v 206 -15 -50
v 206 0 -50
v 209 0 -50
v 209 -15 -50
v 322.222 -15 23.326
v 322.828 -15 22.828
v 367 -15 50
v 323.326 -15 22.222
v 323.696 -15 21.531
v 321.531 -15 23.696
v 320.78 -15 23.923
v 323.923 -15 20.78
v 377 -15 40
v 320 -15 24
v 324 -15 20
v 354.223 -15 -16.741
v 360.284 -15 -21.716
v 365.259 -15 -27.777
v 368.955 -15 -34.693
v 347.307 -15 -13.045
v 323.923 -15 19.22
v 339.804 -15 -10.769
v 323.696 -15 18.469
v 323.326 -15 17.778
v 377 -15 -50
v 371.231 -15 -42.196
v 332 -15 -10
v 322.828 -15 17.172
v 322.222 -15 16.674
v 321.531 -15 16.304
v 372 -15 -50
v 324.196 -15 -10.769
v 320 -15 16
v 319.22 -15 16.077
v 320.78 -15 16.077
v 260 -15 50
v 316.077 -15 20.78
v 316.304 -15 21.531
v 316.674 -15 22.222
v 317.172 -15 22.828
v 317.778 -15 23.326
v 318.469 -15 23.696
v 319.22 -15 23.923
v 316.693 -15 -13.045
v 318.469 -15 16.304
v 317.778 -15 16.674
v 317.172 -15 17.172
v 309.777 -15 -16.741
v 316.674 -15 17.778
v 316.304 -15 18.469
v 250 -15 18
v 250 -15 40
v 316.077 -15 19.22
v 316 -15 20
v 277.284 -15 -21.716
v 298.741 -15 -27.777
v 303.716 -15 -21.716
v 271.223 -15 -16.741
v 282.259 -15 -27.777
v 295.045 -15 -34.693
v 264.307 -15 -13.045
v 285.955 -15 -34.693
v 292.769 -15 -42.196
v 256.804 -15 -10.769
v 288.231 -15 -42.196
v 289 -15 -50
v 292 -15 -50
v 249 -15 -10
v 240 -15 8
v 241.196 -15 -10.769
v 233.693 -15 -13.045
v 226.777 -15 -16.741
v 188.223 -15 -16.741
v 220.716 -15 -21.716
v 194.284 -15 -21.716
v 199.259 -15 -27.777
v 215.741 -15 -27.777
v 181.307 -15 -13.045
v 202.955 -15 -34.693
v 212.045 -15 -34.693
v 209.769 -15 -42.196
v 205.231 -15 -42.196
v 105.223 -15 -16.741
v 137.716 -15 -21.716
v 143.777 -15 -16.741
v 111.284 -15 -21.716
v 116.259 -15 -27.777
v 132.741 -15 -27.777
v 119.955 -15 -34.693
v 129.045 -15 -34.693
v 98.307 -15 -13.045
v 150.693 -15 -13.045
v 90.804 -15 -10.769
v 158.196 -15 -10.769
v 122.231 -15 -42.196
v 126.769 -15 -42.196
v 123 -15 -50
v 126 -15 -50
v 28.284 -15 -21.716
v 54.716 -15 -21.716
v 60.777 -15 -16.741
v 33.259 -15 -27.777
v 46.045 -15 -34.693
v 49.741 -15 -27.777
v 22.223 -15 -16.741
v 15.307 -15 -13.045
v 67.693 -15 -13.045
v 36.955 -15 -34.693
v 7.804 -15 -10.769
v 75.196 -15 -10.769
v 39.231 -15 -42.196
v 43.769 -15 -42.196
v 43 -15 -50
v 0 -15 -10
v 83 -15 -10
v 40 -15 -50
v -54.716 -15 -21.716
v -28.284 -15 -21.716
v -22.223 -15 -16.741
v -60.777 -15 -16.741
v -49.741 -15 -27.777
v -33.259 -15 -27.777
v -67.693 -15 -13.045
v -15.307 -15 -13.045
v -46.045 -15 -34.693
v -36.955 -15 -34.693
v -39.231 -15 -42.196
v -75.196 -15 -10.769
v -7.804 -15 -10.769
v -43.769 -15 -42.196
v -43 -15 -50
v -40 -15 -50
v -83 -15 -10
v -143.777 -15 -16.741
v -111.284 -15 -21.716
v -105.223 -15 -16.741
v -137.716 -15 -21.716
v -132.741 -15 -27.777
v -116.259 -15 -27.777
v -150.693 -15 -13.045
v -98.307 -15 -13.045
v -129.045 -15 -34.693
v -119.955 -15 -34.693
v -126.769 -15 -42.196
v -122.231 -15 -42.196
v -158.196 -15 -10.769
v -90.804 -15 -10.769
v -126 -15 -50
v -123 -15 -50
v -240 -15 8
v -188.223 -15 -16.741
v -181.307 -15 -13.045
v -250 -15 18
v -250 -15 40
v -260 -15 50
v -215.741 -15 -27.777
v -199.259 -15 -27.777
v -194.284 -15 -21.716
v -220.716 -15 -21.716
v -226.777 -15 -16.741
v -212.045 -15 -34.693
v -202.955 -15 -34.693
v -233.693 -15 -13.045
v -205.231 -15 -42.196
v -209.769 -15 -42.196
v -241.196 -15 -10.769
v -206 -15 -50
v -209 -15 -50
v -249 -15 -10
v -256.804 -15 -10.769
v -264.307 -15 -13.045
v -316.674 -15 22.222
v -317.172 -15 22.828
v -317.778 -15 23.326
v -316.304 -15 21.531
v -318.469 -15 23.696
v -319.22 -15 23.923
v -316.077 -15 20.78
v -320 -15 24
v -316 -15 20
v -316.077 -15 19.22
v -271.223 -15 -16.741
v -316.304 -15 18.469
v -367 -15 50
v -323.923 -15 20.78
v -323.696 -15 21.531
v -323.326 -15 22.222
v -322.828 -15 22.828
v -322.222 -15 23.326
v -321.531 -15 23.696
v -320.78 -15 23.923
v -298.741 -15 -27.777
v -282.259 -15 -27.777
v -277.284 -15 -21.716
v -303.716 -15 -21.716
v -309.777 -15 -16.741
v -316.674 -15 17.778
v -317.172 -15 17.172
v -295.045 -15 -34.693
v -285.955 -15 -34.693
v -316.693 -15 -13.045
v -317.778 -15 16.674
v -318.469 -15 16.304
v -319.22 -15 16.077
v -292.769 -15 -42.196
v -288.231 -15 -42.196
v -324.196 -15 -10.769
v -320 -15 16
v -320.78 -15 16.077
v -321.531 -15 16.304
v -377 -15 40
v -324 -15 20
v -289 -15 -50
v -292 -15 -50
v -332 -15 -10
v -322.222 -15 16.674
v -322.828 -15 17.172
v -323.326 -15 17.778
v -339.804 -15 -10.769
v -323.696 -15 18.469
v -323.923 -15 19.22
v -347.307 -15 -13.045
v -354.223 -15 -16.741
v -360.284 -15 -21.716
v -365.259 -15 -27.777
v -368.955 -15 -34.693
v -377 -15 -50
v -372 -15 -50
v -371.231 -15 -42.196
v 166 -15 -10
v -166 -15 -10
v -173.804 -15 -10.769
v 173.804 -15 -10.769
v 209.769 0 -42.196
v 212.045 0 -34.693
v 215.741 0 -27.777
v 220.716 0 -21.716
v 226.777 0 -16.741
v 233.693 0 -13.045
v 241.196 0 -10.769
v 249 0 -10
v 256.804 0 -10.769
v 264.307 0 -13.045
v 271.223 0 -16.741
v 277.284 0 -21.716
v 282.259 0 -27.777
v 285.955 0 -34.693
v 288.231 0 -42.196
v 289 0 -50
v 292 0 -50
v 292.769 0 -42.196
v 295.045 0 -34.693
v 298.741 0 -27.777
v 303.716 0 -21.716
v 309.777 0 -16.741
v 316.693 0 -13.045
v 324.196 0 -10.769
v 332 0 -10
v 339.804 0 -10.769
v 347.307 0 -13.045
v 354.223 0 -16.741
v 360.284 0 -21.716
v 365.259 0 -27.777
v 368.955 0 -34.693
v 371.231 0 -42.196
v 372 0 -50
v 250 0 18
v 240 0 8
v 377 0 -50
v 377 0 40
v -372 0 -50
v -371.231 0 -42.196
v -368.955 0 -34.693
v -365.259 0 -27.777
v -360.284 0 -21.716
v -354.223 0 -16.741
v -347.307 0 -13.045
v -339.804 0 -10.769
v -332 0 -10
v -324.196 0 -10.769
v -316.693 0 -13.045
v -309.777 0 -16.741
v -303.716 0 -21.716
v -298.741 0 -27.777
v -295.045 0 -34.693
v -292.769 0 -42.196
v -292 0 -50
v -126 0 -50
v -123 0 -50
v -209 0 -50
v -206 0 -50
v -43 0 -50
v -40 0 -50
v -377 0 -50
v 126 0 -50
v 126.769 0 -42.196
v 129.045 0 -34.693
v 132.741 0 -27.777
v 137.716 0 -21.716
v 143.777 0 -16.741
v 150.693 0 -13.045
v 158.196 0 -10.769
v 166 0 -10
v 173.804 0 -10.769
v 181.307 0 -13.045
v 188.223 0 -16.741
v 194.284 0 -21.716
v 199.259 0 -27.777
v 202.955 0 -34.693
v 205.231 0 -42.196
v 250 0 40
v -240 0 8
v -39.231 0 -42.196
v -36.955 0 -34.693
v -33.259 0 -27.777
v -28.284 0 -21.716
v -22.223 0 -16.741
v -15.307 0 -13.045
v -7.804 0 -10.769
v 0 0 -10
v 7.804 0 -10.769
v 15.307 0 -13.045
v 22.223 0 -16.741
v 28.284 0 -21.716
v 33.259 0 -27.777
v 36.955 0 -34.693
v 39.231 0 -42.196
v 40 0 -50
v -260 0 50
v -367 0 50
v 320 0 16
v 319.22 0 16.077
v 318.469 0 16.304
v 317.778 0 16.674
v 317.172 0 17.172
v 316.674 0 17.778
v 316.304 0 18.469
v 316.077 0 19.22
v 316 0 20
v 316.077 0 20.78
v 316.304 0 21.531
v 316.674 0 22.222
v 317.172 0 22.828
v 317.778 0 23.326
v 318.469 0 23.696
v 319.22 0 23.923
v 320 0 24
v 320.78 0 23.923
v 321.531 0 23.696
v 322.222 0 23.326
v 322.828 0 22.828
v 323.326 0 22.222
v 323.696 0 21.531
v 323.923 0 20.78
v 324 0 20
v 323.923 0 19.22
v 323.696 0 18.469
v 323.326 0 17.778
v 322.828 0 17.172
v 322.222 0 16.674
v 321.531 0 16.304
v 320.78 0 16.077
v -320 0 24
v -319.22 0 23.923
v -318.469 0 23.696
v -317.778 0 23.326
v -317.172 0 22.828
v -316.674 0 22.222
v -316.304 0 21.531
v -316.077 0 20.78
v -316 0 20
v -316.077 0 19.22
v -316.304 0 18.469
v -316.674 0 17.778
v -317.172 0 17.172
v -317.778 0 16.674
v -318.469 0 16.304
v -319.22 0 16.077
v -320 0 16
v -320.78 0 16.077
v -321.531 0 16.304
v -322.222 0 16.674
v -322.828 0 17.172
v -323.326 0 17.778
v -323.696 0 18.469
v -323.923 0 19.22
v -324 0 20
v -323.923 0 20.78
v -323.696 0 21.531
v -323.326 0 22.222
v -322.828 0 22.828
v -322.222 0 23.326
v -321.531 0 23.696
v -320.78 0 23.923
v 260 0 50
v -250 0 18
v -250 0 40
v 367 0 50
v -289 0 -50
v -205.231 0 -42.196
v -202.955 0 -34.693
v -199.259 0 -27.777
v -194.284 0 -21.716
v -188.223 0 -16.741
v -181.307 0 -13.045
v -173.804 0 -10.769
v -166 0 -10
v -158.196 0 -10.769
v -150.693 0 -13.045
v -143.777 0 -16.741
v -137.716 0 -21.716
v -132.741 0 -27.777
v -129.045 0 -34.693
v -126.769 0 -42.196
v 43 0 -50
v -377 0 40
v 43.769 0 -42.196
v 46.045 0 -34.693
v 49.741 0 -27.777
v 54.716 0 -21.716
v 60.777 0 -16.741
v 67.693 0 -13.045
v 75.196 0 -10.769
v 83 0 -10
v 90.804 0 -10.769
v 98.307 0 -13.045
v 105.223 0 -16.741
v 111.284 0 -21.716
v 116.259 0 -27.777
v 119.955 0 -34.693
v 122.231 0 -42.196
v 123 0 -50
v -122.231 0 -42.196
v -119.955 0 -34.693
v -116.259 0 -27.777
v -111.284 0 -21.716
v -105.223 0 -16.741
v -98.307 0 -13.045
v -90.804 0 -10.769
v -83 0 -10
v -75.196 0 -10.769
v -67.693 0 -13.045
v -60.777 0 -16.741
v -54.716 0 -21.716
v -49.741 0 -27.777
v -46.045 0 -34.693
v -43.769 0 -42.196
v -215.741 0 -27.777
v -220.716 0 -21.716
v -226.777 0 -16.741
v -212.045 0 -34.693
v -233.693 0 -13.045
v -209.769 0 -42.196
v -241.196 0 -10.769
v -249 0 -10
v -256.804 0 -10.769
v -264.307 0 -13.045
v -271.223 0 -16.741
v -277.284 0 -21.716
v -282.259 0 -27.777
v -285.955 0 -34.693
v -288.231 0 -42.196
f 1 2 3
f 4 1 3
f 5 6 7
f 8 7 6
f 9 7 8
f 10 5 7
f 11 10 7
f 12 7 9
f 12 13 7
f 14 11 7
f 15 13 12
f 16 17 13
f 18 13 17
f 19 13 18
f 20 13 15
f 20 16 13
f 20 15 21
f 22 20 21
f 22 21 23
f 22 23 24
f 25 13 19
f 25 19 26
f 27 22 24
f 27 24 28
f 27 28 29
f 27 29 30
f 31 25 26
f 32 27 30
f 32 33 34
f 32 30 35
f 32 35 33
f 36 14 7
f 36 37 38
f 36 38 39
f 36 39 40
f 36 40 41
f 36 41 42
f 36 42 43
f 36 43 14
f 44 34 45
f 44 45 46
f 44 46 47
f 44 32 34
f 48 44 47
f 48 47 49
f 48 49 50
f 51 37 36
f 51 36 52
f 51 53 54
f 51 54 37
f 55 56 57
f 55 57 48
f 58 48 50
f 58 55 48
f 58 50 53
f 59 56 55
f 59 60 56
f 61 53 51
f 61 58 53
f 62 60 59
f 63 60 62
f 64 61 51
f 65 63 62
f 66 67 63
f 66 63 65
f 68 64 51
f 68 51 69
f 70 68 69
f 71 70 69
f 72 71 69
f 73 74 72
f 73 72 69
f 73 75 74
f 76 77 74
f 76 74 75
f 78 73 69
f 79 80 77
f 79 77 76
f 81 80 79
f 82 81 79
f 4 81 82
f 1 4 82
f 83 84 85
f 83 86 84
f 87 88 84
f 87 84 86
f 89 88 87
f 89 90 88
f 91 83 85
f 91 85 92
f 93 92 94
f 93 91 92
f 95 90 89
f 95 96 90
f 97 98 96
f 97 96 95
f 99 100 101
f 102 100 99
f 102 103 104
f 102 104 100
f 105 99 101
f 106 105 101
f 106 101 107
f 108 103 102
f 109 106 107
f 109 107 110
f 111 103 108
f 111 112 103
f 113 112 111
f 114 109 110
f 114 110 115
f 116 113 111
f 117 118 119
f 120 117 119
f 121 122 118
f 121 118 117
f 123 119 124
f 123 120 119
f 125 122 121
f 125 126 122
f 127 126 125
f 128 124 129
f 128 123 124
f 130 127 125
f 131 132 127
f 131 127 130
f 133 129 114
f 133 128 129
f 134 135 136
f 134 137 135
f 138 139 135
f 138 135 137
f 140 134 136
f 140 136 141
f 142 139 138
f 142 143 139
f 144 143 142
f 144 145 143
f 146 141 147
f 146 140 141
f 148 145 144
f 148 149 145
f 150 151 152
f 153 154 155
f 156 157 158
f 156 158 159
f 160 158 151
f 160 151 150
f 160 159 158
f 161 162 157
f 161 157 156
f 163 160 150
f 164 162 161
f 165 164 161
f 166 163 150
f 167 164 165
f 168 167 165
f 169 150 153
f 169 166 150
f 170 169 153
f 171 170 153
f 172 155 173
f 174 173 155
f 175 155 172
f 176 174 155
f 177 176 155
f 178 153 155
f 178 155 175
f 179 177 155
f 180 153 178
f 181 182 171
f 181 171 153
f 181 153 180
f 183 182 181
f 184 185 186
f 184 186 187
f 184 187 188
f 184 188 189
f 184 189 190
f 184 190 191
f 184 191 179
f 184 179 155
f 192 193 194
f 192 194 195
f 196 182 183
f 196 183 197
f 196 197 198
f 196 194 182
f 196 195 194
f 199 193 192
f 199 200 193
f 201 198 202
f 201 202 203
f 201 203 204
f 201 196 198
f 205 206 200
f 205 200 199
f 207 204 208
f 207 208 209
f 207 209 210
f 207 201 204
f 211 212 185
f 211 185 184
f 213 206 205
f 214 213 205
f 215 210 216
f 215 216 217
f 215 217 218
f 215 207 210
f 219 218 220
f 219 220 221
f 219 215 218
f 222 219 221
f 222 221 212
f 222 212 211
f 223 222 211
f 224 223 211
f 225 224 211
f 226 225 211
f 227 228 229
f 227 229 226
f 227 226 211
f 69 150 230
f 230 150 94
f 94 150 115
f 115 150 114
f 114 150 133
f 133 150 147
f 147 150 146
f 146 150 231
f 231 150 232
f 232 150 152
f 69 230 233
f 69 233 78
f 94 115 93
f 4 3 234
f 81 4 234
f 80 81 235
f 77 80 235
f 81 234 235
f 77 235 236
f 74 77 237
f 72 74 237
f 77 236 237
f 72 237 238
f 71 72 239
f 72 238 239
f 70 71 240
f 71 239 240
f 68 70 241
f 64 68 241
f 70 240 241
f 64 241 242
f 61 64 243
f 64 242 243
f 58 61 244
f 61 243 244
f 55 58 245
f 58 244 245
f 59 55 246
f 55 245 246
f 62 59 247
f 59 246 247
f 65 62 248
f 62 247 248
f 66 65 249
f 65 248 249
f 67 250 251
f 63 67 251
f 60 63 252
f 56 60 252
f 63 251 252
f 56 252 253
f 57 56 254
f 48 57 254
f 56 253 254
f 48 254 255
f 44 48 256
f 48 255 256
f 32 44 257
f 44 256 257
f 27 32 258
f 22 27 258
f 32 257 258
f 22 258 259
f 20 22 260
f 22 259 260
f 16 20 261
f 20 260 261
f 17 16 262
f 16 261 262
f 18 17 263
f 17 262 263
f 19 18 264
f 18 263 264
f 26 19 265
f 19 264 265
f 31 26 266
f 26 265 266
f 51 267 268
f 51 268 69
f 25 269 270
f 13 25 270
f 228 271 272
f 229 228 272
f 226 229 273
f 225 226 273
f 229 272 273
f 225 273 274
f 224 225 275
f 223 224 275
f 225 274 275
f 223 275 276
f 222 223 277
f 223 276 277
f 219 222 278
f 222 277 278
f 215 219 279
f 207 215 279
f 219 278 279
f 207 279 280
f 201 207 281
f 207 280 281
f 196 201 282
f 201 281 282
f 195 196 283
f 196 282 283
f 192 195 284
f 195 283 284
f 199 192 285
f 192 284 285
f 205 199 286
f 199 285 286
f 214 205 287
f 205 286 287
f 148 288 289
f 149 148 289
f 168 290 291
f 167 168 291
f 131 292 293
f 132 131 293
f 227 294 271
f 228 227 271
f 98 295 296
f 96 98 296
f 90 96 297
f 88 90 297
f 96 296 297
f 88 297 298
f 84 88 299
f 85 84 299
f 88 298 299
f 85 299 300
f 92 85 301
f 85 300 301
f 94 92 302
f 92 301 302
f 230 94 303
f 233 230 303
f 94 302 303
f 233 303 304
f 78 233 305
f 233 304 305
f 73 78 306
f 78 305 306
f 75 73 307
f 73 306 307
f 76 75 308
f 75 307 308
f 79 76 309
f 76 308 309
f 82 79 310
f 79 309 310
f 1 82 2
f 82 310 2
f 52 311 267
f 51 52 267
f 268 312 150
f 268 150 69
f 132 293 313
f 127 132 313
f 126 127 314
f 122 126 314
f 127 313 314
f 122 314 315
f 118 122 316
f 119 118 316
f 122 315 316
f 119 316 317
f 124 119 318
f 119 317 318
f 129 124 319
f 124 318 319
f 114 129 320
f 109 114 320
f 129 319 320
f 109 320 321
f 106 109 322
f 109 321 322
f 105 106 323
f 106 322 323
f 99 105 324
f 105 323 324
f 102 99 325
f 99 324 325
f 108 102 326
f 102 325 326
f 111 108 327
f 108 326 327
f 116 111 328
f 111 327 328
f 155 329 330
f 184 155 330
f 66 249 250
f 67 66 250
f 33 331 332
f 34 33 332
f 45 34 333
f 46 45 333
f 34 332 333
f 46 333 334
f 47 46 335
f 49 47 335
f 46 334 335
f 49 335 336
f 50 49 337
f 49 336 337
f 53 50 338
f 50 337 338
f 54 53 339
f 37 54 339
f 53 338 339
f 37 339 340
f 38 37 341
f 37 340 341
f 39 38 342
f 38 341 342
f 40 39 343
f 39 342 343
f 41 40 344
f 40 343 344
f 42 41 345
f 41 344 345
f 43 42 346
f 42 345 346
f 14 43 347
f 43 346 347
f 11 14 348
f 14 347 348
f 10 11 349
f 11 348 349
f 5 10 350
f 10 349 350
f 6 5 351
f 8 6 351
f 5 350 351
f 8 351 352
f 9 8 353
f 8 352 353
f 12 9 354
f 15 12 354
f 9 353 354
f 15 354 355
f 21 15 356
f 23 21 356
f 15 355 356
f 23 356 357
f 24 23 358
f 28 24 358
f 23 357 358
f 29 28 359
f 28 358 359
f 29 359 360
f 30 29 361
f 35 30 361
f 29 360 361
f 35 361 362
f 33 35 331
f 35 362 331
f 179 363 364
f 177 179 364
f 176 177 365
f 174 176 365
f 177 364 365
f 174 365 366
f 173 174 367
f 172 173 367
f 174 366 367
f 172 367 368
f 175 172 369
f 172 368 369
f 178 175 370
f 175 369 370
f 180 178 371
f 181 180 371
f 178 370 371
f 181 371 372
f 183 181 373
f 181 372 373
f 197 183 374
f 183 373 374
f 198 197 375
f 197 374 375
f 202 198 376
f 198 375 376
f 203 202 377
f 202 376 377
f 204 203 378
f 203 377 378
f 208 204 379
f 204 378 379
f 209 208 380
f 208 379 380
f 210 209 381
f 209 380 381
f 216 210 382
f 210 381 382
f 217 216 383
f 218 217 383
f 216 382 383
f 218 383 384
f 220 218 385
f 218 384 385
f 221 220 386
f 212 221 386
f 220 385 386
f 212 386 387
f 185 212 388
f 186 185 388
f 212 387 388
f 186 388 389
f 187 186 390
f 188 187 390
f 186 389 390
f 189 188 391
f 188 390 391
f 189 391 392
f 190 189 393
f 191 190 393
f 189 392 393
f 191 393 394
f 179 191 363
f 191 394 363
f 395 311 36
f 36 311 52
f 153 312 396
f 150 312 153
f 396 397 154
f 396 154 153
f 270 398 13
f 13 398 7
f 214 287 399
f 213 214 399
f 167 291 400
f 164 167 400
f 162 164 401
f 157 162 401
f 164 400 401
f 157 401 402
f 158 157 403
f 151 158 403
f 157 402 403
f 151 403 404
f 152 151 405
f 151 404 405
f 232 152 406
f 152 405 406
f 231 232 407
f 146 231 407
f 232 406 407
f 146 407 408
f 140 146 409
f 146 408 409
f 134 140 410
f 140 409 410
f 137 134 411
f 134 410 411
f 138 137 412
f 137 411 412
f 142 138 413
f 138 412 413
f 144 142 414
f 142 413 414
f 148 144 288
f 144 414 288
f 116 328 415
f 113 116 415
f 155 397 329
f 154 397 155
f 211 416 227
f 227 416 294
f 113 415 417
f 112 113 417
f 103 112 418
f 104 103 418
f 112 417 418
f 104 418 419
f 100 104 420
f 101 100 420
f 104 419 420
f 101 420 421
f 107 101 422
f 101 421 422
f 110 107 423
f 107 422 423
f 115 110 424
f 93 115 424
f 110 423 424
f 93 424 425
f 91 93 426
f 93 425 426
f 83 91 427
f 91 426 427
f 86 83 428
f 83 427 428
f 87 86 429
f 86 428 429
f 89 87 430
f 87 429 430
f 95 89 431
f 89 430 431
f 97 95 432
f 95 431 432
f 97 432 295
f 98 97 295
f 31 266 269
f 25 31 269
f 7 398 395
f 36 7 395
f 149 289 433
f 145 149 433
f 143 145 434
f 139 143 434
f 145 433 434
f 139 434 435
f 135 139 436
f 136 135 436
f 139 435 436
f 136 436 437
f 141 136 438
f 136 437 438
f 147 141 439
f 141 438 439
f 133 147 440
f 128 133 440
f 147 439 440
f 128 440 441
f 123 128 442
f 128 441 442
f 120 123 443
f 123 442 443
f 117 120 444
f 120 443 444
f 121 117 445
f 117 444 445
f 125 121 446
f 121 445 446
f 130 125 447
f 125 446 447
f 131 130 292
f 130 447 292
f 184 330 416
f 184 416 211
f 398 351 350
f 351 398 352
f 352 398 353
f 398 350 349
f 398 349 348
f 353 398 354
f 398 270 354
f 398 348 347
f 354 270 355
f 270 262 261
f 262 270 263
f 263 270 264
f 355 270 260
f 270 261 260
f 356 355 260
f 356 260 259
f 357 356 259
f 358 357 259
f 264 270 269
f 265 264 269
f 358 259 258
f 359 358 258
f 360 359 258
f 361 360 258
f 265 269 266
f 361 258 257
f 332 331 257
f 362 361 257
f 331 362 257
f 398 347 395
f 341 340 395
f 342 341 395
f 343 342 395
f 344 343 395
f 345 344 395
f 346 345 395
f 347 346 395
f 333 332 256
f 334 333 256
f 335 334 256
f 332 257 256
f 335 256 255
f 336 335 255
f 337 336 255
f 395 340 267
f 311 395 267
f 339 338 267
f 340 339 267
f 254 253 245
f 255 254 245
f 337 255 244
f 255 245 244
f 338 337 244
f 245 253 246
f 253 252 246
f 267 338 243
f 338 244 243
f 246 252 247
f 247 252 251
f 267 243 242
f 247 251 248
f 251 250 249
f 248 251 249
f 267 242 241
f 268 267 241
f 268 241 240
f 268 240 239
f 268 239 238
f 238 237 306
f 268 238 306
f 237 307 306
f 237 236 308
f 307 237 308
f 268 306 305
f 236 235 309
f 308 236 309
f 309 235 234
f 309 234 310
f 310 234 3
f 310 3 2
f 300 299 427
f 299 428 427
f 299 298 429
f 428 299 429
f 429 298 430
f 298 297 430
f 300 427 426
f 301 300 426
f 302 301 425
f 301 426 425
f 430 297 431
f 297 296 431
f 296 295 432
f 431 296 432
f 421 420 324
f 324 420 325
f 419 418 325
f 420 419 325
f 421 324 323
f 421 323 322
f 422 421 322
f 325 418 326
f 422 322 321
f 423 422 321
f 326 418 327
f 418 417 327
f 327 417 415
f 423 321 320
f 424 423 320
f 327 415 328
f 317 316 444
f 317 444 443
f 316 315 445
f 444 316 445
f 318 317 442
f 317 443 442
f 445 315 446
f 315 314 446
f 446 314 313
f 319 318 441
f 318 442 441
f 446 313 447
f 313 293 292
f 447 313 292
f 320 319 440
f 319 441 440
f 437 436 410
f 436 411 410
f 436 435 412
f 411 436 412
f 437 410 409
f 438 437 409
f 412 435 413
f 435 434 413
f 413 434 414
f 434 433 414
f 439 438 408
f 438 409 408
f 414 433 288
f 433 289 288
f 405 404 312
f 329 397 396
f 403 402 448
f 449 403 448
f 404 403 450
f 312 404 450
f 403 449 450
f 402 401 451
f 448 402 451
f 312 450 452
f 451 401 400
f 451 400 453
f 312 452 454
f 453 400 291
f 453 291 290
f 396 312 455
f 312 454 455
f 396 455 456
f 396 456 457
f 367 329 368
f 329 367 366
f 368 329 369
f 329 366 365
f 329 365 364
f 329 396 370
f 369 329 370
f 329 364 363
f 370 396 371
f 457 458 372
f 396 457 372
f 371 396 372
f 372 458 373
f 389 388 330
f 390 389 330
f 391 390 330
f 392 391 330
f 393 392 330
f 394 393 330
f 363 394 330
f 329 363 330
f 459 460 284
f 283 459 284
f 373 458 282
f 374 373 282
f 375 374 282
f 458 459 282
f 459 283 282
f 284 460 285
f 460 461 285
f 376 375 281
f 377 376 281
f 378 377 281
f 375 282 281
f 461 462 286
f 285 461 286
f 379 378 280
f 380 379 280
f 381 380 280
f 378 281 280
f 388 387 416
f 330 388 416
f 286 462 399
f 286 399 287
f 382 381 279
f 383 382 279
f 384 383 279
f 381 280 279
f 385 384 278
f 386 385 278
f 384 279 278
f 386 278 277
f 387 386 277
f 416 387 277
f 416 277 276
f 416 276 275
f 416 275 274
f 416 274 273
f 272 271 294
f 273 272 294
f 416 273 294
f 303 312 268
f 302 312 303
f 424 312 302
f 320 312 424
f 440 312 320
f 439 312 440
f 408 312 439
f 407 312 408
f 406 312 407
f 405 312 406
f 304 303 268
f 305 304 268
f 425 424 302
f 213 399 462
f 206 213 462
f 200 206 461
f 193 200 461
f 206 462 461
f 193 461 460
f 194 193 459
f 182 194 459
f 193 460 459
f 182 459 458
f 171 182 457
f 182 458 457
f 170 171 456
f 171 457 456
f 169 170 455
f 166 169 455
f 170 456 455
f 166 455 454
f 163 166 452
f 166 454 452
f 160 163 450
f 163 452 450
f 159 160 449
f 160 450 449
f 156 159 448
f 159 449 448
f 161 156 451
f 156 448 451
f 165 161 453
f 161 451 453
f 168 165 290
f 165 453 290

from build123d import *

# Parameters (mm, degrees)
SKETCH1_R          = 4
BASE_FLANGE1_DEPTH = 15
SKETCH6_W          = 500
SKETCH6_H          = 42
CUT_EXTRUDE1_DEPTH = 381.59689962
CHAMFER1_SIZE      = 10


# Sheet-metal steps are written as plain solids
with BuildPart() as part:
    # Sketch1 → Base-Flange1 (new body)
    with BuildSketch(Plane(origin=(0, 0, 0), x_dir=(1, 0, 0), z_dir=(0, 1, 0))):
        with BuildLine():
            Line((372, 50), (377, 50))
            Line((377, 50), (377, -50))
            Line((377, -50), (-377, -50))
            Line((-377, -50), (-377, 50))
            Line((-377, 50), (-372, 50))
            ThreePointArc((-372, 50), (-332, 10), (-292, 50))
            Line((-292, 50), (-289, 50))
            ThreePointArc((-289, 50), (-249, 10), (-209, 50))
            Line((-209, 50), (-206, 50))
            ThreePointArc((-206, 50), (-166, 10), (-126, 50))
            Line((-126, 50), (-123, 50))
            ThreePointArc((-123, 50), (-83, 10), (-43, 50))
            Line((-43, 50), (-40, 50))
            ThreePointArc((-40, 50), (0, 10), (40, 50))
            Line((40, 50), (43, 50))
            ThreePointArc((43, 50), (83, 10), (123, 50))
            Line((123, 50), (126, 50))
            ThreePointArc((126, 50), (166, 10), (206, 50))
            Line((206, 50), (209, 50))
            ThreePointArc((209, 50), (249, 10), (289, 50))
            Line((289, 50), (292, 50))
            ThreePointArc((292, 50), (332, 10), (372, 50))
        make_face()
        with Locations(Location((-320, -20, 0), (0, 0, 270))):
            Circle(SKETCH1_R, mode=Mode.SUBTRACT)
        with Locations(Location((320, -20, 0), (0, 0, 90))):
            Circle(SKETCH1_R, mode=Mode.SUBTRACT)
    extrude(amount=-BASE_FLANGE1_DEPTH)

    # Sketch6 → Cut-Extrude1 (cut, through all)
    with BuildSketch(Plane(origin=(0, 0, 0), x_dir=(1, 0, 0), z_dir=(0, 1, 0))):
        with Locations((0, -29)):
            Rectangle(SKETCH6_W, SKETCH6_H)
    extrude(amount=-CUT_EXTRUDE1_DEPTH, mode=Mode.SUBTRACT)

    # Chamfer1
    chamfer1_edges = [part.edges().sort_by_distance(p)[0] for p in [
        (377, -7.5, 50),
        (-377, -7.5, 50),
        (-250, -7.5, 50),
        (-250, -7.5, 8),
        (250, -7.5, 8),
        (250, -7.5, 50),
    ]]
    chamfer(chamfer1_edges, length=CHAMFER1_SIZE)


solid = part.part
